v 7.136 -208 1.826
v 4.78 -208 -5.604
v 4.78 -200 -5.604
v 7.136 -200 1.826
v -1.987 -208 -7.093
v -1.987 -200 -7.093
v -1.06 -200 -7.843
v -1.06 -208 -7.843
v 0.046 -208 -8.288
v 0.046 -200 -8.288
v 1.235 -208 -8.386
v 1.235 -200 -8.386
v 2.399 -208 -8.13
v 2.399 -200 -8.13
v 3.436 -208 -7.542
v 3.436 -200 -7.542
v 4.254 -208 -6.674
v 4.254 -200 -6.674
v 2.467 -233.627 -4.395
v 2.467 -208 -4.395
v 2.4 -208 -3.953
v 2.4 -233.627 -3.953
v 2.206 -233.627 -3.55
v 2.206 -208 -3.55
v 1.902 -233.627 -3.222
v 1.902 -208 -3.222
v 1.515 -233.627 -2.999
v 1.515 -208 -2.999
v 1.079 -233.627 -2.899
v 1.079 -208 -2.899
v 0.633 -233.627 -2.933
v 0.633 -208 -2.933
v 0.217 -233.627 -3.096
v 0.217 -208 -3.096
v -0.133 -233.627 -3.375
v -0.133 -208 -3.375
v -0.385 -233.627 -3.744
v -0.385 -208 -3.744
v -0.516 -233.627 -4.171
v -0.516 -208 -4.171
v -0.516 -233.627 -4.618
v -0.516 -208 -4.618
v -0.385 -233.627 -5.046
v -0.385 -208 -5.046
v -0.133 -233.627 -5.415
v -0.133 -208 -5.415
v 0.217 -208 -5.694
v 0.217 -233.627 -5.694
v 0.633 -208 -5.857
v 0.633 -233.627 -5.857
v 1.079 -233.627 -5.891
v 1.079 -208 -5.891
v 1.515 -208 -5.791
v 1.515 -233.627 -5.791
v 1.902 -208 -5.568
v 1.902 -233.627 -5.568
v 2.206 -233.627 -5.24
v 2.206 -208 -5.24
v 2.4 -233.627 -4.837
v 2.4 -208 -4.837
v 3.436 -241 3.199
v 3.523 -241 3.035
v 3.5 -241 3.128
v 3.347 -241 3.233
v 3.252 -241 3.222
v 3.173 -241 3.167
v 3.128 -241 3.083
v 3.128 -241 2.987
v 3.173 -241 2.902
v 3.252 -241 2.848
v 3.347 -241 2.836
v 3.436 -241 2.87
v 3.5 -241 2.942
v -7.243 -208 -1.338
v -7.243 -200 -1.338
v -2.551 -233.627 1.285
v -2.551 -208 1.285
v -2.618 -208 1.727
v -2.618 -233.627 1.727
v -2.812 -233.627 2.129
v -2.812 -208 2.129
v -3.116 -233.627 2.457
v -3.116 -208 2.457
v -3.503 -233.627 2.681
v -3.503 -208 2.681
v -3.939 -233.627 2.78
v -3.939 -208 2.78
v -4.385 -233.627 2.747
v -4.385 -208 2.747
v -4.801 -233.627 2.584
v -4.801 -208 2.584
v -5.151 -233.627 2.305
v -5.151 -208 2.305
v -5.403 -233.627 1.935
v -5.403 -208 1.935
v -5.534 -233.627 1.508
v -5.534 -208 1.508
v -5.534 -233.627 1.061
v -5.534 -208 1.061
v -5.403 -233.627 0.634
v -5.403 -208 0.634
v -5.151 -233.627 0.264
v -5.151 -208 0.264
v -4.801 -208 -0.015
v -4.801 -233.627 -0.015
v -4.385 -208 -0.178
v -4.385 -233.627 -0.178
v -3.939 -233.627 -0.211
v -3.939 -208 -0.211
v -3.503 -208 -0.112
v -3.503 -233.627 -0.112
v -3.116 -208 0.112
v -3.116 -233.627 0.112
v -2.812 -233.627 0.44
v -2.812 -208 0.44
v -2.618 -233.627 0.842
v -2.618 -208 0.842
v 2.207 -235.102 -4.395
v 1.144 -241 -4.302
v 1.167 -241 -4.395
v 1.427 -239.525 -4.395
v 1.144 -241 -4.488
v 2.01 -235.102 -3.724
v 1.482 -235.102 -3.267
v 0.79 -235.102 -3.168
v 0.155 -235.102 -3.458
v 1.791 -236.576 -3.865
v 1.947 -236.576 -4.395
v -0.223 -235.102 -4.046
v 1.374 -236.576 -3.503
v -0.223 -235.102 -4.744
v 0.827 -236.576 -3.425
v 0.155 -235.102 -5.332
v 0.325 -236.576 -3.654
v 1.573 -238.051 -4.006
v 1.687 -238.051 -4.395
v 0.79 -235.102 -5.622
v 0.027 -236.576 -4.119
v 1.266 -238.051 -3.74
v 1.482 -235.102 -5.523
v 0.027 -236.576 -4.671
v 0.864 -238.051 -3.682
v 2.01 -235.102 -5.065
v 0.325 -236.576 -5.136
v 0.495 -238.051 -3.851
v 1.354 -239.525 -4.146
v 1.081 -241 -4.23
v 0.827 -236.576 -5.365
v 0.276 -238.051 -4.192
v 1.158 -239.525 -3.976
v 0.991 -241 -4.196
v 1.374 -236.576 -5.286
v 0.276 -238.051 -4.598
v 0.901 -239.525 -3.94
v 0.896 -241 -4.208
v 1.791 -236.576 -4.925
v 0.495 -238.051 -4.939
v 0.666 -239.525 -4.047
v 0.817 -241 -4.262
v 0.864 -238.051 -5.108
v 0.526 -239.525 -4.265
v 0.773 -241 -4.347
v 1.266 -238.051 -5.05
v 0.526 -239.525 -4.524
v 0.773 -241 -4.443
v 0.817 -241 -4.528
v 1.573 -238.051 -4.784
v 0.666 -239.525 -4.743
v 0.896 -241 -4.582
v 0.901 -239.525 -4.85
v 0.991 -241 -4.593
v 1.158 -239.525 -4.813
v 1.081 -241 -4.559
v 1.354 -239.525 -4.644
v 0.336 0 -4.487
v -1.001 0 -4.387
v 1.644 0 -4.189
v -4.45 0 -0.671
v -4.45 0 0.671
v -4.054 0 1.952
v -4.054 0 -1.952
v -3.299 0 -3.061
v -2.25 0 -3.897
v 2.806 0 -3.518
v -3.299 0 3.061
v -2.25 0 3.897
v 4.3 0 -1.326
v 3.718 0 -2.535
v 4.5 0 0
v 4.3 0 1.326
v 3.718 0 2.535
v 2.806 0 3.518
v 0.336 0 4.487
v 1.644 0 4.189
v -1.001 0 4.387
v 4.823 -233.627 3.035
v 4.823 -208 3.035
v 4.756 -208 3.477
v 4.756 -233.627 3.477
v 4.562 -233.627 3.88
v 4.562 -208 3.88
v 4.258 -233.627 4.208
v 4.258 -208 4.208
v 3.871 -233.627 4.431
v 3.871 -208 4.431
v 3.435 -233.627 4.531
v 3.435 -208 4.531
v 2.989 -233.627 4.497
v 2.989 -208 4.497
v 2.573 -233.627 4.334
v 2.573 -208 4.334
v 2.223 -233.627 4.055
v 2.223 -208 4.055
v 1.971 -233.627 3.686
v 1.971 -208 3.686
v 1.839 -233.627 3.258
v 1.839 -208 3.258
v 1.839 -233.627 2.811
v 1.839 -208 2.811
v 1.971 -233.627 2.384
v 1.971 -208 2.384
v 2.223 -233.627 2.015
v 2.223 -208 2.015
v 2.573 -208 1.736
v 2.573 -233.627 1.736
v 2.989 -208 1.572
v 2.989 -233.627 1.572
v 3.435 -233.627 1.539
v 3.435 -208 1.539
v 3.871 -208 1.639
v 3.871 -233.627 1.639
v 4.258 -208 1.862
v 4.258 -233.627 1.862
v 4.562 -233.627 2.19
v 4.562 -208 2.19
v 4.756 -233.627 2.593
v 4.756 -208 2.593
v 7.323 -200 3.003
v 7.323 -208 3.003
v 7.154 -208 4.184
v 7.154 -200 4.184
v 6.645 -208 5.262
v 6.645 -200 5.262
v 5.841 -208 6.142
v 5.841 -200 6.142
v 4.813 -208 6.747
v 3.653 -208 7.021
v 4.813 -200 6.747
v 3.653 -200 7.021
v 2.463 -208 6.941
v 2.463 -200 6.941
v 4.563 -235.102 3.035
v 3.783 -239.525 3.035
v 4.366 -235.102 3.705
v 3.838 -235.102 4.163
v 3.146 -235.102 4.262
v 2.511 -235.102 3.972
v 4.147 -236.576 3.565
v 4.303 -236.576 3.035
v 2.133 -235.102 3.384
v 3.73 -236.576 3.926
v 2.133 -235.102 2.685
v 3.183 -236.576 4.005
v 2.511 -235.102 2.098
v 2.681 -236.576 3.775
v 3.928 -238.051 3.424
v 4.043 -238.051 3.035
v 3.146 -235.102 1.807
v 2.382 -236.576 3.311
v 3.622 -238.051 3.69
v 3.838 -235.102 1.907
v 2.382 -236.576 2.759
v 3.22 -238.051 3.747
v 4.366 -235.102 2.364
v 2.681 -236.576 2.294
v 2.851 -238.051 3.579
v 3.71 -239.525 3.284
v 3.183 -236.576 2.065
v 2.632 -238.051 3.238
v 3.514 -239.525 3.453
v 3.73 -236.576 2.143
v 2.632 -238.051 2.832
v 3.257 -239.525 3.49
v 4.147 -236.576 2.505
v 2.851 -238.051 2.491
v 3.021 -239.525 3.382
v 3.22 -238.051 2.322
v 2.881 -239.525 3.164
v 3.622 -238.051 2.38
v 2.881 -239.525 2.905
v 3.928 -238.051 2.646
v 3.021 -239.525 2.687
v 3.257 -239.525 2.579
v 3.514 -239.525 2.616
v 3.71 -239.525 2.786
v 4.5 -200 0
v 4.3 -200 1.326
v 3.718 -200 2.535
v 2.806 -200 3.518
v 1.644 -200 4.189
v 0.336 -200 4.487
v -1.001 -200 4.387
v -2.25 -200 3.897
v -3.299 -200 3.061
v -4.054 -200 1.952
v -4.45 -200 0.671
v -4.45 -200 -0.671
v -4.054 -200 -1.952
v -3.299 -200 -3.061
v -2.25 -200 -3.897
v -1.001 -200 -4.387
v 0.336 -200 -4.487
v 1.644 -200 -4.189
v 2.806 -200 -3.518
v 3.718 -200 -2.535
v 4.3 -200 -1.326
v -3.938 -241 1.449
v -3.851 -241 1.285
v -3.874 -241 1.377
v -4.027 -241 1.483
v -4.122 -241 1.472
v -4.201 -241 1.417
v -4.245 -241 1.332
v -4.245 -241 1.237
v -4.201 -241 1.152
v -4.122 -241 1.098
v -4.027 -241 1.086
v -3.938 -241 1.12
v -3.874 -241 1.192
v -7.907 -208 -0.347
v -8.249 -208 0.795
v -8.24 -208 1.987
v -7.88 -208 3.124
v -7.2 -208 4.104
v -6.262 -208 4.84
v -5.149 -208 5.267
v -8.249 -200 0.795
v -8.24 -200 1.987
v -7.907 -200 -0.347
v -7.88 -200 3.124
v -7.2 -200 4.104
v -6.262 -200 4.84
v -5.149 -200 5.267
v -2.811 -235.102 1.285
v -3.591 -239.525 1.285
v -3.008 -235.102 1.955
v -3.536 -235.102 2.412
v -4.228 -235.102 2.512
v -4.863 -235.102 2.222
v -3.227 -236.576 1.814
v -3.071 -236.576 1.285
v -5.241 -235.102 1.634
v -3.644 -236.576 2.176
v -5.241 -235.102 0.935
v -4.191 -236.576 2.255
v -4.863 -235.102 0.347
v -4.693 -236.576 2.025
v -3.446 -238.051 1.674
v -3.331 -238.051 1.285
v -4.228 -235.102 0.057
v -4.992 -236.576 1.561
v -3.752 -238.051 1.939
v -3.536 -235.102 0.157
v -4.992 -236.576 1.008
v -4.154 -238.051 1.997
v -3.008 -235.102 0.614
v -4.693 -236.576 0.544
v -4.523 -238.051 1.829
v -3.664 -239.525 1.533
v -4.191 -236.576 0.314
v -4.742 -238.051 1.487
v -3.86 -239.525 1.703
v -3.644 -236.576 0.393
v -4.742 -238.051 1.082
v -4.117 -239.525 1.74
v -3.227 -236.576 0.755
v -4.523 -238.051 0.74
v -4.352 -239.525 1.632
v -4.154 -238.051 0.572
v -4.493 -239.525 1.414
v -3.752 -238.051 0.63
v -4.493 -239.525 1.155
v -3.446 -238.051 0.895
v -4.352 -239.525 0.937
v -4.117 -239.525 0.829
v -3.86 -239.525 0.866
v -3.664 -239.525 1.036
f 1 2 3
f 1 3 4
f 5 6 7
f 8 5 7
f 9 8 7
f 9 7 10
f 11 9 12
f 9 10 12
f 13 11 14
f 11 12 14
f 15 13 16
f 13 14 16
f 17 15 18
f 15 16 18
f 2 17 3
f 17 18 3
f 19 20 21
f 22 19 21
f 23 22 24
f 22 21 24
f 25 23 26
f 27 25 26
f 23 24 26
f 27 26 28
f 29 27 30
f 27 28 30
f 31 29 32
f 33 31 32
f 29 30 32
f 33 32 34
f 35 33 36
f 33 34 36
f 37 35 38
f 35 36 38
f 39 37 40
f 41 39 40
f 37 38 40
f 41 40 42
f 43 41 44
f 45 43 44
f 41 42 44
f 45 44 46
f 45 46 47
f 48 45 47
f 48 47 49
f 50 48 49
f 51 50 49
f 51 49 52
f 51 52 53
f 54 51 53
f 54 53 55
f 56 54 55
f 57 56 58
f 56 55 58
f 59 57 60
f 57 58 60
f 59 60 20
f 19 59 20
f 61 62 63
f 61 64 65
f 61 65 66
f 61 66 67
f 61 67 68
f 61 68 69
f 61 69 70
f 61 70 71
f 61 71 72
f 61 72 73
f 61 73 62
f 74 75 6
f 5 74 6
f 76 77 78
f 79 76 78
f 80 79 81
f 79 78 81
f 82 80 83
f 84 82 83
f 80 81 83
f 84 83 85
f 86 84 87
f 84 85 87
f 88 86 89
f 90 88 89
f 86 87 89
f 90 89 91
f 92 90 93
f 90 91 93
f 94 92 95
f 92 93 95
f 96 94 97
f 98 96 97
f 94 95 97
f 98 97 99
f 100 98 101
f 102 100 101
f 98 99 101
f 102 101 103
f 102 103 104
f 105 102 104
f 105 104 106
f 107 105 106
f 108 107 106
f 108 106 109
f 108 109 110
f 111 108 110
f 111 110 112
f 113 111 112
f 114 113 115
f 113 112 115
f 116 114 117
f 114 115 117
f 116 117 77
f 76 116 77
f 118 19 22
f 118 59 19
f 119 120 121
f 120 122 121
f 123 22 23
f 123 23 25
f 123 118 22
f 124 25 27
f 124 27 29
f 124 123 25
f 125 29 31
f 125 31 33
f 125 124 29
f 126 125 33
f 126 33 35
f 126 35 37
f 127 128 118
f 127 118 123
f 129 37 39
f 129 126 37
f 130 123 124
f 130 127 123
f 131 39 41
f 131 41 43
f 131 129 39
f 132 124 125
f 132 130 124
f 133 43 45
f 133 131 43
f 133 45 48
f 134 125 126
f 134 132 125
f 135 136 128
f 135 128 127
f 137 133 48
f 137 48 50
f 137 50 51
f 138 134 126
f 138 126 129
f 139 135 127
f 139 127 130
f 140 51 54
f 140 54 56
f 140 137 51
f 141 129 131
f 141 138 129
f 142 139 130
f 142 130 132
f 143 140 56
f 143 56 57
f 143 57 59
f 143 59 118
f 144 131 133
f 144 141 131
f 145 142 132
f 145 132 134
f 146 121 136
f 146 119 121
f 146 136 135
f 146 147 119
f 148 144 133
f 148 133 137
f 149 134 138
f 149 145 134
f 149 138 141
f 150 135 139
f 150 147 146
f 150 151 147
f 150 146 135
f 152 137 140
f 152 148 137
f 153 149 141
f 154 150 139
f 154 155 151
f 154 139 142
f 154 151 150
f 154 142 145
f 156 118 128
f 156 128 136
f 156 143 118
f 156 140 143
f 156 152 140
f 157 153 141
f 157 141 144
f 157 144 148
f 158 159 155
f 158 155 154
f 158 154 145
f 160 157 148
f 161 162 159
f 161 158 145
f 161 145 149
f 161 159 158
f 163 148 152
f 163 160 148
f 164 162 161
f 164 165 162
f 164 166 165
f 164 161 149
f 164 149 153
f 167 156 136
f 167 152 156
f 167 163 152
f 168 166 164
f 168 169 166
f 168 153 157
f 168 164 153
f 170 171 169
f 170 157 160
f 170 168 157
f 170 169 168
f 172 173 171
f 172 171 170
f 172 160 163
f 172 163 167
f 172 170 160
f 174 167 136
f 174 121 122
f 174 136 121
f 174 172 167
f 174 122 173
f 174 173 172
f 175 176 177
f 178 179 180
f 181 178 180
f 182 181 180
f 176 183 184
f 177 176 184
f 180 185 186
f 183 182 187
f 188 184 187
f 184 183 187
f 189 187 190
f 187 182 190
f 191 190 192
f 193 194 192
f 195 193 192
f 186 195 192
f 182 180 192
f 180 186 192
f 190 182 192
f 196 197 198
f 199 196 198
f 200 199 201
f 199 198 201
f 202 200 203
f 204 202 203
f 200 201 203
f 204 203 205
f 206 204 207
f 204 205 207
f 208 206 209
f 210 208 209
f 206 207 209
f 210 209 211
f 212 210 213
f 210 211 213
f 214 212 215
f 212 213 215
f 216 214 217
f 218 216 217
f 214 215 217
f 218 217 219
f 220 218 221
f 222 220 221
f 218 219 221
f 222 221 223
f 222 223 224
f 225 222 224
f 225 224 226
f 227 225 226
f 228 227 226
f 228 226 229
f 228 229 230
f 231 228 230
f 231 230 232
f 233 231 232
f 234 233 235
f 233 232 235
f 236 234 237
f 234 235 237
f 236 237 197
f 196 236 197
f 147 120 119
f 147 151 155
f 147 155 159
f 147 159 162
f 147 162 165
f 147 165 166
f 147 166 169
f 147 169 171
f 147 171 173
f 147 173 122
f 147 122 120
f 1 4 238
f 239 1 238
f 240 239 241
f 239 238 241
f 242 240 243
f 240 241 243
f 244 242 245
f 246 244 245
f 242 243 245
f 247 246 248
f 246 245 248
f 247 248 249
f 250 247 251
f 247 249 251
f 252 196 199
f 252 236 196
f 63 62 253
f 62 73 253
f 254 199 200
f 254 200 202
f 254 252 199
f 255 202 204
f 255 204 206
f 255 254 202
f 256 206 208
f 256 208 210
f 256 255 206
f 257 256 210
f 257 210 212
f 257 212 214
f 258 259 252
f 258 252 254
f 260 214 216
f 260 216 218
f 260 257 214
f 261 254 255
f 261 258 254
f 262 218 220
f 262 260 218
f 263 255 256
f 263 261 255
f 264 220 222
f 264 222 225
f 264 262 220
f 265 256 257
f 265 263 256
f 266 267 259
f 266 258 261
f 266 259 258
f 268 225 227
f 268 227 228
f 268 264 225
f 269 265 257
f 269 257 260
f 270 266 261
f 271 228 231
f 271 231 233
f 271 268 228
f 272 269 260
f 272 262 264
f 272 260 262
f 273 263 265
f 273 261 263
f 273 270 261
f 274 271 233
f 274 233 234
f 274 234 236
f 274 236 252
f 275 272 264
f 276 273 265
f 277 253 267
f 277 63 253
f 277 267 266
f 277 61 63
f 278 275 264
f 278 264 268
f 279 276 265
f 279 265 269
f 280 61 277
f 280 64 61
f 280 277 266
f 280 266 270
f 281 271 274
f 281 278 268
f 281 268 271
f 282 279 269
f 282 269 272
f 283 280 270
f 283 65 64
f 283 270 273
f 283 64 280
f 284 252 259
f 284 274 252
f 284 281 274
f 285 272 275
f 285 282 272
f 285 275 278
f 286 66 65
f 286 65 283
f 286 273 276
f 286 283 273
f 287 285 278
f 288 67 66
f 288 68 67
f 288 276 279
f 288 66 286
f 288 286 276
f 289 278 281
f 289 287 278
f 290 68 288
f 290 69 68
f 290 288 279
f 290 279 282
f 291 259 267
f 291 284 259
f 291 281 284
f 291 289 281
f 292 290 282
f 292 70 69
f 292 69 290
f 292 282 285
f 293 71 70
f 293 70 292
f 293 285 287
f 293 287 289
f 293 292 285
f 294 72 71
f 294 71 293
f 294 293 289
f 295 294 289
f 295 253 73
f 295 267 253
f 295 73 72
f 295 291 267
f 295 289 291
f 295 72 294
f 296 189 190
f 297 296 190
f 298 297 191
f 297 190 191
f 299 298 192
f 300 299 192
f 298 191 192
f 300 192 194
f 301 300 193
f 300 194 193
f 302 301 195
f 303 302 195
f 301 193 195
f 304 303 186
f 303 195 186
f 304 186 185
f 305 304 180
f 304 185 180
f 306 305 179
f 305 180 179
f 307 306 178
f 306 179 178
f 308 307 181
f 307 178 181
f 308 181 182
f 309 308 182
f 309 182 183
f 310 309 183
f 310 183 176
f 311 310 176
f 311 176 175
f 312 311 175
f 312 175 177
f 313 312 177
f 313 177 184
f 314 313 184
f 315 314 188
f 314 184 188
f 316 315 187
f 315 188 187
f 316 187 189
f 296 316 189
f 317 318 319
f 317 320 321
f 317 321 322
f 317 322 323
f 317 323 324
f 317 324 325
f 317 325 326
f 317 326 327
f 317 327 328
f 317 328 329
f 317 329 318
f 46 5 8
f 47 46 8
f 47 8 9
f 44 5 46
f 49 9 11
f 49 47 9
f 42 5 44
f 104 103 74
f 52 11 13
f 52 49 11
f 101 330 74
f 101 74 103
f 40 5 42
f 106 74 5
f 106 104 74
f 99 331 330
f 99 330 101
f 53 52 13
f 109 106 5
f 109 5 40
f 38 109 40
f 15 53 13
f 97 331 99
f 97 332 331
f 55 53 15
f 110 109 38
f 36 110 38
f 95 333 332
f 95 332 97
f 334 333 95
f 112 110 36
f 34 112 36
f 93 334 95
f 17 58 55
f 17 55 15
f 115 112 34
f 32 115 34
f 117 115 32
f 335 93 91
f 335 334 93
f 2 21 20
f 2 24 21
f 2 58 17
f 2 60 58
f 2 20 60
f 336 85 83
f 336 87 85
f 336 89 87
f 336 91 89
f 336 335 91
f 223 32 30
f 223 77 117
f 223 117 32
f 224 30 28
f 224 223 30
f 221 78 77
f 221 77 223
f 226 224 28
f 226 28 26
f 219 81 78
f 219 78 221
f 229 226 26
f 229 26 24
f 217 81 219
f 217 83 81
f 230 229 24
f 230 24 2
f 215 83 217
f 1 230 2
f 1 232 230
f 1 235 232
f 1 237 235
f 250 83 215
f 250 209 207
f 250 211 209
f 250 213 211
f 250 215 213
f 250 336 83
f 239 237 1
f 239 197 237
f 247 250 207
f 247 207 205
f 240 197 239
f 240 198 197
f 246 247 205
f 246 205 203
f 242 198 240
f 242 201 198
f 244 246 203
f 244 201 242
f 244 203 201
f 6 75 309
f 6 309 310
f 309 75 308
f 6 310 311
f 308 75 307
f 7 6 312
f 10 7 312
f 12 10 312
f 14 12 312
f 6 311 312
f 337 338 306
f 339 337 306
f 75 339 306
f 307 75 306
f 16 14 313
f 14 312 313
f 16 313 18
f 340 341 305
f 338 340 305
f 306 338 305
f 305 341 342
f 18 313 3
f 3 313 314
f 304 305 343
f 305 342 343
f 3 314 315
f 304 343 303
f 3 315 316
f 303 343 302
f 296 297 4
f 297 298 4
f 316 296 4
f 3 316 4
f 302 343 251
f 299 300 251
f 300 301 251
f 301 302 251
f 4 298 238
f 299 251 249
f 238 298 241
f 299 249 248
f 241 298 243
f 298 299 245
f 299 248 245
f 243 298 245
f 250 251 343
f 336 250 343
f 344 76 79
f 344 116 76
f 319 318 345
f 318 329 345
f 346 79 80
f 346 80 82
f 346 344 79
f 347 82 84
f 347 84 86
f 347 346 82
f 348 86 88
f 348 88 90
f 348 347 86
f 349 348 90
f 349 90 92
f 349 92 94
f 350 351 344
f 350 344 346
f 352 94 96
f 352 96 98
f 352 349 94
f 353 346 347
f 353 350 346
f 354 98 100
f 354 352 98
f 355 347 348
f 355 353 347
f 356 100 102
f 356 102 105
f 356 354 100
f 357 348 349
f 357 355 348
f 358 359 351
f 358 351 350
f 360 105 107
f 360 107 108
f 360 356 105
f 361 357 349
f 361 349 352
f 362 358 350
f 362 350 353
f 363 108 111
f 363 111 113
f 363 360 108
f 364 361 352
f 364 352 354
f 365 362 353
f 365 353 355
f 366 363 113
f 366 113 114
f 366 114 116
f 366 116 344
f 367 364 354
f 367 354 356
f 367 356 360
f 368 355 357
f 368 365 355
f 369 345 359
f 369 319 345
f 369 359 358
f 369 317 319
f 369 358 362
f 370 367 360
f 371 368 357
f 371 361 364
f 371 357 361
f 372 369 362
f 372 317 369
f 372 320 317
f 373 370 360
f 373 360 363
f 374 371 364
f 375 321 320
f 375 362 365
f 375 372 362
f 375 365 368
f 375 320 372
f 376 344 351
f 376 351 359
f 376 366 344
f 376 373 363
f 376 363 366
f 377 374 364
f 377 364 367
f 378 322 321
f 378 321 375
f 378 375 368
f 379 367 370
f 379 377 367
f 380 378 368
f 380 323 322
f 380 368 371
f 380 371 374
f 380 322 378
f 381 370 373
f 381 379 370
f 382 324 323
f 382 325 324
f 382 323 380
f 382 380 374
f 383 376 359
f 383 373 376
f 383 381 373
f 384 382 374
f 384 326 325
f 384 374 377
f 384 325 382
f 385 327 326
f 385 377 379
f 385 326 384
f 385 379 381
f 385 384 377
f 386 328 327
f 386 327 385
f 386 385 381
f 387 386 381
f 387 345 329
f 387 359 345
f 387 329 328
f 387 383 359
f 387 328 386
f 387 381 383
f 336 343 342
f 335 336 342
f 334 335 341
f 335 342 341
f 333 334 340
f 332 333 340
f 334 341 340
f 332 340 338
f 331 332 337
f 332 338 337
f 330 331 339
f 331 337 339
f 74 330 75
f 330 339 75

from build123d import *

# Parameters (mm, degrees)
F0_R       = 4.5
F1_DEPTH   = 200
F2_R       = 4.5
F3_DEPTH   = 8
F4_R       = 1.5
F5_DEPTH   = 33
F6_SIZE2   = 1.3
F6_SIZE    = 7.3726663655
F6_2_SIZE2 = 1.3
F6_2_SIZE  = 7.3726663655
F6_3_SIZE2 = 1.3
F6_3_SIZE  = 7.3726663655


with BuildPart() as f1:
    # F0 (on Front) → F1 (new body)
    with BuildSketch(Plane.XZ):
        Circle(F0_R)
    extrude(amount=F1_DEPTH)

    # F2 (on face) → F3 (join)
    with BuildSketch(Plane.XZ.offset(200)):
        with BuildLine():
            Line((2.4631588878, 6.9413866261), (-5.1490192915, 5.2666498209))
            ThreePointArc((-5.1490192915, 5.2666498209), (-8.1024719288, 2.5690365204), (-7.2429965996, -1.3375351427))
            Line((-7.2429965996, -1.3375351427), (-1.986542892, -7.0925064215))
            ThreePointArc((-1.986542892, -7.0925064215), (1.8263850745, -8.301464784), (4.7798377118, -5.6038514834))
            Line((4.7798377118, -5.6038514834), (7.1355621835, 1.8258566006))
            ThreePointArc((7.1355621835, 1.8258566006), (6.2760868543, 5.7324282636), (2.4631588878, 6.9413866261))
        make_face()
        Circle(F2_R, mode=Mode.SUBTRACT)
        Circle(F2_R)
    extrude(amount=F3_DEPTH)

    # F4 (on face) → F5 (join)
    with BuildSketch(Plane.XZ.offset(208)):
        with Locations((3.322634217, 3.0348149631)):
            Circle(F4_R)
        with Locations((-4.0512359644, 1.2845182602)):
            Circle(F4_R)
        with Locations((0.9669097453, -4.3948931209)):
            Circle(F4_R)
    extrude(amount=F5_DEPTH)

    # F6
    f6_edges = [f1.edges().sort_by_distance(p)[0] for p in [
        (-0.53309, -241, -4.394893),
    ]]
    f6_side = f1.faces().sort_by_distance((-0.53309, -224.5, -4.394893))[0]
    chamfer(f6_edges, length=F6_SIZE, length2=F6_SIZE2, reference=f6_side)

    # F6#2
    f6_2_edges = [f1.edges().sort_by_distance(p)[0] for p in [
        (-5.551236, -241, 1.284518),
    ]]
    f6_2_side = f1.faces().sort_by_distance((-5.551236, -224.5, 1.284518))[0]
    chamfer(f6_2_edges, length=F6_2_SIZE, length2=F6_2_SIZE2, reference=f6_2_side)

    # F6#3
    f6_3_edges = [f1.edges().sort_by_distance(p)[0] for p in [
        (1.822634, -241, 3.034815),
    ]]
    f6_3_side = f1.faces().sort_by_distance((1.822634, -224.5, 3.034815))[0]
    chamfer(f6_3_edges, length=F6_3_SIZE, length2=F6_3_SIZE2, reference=f6_3_side)


solid = f1.part
